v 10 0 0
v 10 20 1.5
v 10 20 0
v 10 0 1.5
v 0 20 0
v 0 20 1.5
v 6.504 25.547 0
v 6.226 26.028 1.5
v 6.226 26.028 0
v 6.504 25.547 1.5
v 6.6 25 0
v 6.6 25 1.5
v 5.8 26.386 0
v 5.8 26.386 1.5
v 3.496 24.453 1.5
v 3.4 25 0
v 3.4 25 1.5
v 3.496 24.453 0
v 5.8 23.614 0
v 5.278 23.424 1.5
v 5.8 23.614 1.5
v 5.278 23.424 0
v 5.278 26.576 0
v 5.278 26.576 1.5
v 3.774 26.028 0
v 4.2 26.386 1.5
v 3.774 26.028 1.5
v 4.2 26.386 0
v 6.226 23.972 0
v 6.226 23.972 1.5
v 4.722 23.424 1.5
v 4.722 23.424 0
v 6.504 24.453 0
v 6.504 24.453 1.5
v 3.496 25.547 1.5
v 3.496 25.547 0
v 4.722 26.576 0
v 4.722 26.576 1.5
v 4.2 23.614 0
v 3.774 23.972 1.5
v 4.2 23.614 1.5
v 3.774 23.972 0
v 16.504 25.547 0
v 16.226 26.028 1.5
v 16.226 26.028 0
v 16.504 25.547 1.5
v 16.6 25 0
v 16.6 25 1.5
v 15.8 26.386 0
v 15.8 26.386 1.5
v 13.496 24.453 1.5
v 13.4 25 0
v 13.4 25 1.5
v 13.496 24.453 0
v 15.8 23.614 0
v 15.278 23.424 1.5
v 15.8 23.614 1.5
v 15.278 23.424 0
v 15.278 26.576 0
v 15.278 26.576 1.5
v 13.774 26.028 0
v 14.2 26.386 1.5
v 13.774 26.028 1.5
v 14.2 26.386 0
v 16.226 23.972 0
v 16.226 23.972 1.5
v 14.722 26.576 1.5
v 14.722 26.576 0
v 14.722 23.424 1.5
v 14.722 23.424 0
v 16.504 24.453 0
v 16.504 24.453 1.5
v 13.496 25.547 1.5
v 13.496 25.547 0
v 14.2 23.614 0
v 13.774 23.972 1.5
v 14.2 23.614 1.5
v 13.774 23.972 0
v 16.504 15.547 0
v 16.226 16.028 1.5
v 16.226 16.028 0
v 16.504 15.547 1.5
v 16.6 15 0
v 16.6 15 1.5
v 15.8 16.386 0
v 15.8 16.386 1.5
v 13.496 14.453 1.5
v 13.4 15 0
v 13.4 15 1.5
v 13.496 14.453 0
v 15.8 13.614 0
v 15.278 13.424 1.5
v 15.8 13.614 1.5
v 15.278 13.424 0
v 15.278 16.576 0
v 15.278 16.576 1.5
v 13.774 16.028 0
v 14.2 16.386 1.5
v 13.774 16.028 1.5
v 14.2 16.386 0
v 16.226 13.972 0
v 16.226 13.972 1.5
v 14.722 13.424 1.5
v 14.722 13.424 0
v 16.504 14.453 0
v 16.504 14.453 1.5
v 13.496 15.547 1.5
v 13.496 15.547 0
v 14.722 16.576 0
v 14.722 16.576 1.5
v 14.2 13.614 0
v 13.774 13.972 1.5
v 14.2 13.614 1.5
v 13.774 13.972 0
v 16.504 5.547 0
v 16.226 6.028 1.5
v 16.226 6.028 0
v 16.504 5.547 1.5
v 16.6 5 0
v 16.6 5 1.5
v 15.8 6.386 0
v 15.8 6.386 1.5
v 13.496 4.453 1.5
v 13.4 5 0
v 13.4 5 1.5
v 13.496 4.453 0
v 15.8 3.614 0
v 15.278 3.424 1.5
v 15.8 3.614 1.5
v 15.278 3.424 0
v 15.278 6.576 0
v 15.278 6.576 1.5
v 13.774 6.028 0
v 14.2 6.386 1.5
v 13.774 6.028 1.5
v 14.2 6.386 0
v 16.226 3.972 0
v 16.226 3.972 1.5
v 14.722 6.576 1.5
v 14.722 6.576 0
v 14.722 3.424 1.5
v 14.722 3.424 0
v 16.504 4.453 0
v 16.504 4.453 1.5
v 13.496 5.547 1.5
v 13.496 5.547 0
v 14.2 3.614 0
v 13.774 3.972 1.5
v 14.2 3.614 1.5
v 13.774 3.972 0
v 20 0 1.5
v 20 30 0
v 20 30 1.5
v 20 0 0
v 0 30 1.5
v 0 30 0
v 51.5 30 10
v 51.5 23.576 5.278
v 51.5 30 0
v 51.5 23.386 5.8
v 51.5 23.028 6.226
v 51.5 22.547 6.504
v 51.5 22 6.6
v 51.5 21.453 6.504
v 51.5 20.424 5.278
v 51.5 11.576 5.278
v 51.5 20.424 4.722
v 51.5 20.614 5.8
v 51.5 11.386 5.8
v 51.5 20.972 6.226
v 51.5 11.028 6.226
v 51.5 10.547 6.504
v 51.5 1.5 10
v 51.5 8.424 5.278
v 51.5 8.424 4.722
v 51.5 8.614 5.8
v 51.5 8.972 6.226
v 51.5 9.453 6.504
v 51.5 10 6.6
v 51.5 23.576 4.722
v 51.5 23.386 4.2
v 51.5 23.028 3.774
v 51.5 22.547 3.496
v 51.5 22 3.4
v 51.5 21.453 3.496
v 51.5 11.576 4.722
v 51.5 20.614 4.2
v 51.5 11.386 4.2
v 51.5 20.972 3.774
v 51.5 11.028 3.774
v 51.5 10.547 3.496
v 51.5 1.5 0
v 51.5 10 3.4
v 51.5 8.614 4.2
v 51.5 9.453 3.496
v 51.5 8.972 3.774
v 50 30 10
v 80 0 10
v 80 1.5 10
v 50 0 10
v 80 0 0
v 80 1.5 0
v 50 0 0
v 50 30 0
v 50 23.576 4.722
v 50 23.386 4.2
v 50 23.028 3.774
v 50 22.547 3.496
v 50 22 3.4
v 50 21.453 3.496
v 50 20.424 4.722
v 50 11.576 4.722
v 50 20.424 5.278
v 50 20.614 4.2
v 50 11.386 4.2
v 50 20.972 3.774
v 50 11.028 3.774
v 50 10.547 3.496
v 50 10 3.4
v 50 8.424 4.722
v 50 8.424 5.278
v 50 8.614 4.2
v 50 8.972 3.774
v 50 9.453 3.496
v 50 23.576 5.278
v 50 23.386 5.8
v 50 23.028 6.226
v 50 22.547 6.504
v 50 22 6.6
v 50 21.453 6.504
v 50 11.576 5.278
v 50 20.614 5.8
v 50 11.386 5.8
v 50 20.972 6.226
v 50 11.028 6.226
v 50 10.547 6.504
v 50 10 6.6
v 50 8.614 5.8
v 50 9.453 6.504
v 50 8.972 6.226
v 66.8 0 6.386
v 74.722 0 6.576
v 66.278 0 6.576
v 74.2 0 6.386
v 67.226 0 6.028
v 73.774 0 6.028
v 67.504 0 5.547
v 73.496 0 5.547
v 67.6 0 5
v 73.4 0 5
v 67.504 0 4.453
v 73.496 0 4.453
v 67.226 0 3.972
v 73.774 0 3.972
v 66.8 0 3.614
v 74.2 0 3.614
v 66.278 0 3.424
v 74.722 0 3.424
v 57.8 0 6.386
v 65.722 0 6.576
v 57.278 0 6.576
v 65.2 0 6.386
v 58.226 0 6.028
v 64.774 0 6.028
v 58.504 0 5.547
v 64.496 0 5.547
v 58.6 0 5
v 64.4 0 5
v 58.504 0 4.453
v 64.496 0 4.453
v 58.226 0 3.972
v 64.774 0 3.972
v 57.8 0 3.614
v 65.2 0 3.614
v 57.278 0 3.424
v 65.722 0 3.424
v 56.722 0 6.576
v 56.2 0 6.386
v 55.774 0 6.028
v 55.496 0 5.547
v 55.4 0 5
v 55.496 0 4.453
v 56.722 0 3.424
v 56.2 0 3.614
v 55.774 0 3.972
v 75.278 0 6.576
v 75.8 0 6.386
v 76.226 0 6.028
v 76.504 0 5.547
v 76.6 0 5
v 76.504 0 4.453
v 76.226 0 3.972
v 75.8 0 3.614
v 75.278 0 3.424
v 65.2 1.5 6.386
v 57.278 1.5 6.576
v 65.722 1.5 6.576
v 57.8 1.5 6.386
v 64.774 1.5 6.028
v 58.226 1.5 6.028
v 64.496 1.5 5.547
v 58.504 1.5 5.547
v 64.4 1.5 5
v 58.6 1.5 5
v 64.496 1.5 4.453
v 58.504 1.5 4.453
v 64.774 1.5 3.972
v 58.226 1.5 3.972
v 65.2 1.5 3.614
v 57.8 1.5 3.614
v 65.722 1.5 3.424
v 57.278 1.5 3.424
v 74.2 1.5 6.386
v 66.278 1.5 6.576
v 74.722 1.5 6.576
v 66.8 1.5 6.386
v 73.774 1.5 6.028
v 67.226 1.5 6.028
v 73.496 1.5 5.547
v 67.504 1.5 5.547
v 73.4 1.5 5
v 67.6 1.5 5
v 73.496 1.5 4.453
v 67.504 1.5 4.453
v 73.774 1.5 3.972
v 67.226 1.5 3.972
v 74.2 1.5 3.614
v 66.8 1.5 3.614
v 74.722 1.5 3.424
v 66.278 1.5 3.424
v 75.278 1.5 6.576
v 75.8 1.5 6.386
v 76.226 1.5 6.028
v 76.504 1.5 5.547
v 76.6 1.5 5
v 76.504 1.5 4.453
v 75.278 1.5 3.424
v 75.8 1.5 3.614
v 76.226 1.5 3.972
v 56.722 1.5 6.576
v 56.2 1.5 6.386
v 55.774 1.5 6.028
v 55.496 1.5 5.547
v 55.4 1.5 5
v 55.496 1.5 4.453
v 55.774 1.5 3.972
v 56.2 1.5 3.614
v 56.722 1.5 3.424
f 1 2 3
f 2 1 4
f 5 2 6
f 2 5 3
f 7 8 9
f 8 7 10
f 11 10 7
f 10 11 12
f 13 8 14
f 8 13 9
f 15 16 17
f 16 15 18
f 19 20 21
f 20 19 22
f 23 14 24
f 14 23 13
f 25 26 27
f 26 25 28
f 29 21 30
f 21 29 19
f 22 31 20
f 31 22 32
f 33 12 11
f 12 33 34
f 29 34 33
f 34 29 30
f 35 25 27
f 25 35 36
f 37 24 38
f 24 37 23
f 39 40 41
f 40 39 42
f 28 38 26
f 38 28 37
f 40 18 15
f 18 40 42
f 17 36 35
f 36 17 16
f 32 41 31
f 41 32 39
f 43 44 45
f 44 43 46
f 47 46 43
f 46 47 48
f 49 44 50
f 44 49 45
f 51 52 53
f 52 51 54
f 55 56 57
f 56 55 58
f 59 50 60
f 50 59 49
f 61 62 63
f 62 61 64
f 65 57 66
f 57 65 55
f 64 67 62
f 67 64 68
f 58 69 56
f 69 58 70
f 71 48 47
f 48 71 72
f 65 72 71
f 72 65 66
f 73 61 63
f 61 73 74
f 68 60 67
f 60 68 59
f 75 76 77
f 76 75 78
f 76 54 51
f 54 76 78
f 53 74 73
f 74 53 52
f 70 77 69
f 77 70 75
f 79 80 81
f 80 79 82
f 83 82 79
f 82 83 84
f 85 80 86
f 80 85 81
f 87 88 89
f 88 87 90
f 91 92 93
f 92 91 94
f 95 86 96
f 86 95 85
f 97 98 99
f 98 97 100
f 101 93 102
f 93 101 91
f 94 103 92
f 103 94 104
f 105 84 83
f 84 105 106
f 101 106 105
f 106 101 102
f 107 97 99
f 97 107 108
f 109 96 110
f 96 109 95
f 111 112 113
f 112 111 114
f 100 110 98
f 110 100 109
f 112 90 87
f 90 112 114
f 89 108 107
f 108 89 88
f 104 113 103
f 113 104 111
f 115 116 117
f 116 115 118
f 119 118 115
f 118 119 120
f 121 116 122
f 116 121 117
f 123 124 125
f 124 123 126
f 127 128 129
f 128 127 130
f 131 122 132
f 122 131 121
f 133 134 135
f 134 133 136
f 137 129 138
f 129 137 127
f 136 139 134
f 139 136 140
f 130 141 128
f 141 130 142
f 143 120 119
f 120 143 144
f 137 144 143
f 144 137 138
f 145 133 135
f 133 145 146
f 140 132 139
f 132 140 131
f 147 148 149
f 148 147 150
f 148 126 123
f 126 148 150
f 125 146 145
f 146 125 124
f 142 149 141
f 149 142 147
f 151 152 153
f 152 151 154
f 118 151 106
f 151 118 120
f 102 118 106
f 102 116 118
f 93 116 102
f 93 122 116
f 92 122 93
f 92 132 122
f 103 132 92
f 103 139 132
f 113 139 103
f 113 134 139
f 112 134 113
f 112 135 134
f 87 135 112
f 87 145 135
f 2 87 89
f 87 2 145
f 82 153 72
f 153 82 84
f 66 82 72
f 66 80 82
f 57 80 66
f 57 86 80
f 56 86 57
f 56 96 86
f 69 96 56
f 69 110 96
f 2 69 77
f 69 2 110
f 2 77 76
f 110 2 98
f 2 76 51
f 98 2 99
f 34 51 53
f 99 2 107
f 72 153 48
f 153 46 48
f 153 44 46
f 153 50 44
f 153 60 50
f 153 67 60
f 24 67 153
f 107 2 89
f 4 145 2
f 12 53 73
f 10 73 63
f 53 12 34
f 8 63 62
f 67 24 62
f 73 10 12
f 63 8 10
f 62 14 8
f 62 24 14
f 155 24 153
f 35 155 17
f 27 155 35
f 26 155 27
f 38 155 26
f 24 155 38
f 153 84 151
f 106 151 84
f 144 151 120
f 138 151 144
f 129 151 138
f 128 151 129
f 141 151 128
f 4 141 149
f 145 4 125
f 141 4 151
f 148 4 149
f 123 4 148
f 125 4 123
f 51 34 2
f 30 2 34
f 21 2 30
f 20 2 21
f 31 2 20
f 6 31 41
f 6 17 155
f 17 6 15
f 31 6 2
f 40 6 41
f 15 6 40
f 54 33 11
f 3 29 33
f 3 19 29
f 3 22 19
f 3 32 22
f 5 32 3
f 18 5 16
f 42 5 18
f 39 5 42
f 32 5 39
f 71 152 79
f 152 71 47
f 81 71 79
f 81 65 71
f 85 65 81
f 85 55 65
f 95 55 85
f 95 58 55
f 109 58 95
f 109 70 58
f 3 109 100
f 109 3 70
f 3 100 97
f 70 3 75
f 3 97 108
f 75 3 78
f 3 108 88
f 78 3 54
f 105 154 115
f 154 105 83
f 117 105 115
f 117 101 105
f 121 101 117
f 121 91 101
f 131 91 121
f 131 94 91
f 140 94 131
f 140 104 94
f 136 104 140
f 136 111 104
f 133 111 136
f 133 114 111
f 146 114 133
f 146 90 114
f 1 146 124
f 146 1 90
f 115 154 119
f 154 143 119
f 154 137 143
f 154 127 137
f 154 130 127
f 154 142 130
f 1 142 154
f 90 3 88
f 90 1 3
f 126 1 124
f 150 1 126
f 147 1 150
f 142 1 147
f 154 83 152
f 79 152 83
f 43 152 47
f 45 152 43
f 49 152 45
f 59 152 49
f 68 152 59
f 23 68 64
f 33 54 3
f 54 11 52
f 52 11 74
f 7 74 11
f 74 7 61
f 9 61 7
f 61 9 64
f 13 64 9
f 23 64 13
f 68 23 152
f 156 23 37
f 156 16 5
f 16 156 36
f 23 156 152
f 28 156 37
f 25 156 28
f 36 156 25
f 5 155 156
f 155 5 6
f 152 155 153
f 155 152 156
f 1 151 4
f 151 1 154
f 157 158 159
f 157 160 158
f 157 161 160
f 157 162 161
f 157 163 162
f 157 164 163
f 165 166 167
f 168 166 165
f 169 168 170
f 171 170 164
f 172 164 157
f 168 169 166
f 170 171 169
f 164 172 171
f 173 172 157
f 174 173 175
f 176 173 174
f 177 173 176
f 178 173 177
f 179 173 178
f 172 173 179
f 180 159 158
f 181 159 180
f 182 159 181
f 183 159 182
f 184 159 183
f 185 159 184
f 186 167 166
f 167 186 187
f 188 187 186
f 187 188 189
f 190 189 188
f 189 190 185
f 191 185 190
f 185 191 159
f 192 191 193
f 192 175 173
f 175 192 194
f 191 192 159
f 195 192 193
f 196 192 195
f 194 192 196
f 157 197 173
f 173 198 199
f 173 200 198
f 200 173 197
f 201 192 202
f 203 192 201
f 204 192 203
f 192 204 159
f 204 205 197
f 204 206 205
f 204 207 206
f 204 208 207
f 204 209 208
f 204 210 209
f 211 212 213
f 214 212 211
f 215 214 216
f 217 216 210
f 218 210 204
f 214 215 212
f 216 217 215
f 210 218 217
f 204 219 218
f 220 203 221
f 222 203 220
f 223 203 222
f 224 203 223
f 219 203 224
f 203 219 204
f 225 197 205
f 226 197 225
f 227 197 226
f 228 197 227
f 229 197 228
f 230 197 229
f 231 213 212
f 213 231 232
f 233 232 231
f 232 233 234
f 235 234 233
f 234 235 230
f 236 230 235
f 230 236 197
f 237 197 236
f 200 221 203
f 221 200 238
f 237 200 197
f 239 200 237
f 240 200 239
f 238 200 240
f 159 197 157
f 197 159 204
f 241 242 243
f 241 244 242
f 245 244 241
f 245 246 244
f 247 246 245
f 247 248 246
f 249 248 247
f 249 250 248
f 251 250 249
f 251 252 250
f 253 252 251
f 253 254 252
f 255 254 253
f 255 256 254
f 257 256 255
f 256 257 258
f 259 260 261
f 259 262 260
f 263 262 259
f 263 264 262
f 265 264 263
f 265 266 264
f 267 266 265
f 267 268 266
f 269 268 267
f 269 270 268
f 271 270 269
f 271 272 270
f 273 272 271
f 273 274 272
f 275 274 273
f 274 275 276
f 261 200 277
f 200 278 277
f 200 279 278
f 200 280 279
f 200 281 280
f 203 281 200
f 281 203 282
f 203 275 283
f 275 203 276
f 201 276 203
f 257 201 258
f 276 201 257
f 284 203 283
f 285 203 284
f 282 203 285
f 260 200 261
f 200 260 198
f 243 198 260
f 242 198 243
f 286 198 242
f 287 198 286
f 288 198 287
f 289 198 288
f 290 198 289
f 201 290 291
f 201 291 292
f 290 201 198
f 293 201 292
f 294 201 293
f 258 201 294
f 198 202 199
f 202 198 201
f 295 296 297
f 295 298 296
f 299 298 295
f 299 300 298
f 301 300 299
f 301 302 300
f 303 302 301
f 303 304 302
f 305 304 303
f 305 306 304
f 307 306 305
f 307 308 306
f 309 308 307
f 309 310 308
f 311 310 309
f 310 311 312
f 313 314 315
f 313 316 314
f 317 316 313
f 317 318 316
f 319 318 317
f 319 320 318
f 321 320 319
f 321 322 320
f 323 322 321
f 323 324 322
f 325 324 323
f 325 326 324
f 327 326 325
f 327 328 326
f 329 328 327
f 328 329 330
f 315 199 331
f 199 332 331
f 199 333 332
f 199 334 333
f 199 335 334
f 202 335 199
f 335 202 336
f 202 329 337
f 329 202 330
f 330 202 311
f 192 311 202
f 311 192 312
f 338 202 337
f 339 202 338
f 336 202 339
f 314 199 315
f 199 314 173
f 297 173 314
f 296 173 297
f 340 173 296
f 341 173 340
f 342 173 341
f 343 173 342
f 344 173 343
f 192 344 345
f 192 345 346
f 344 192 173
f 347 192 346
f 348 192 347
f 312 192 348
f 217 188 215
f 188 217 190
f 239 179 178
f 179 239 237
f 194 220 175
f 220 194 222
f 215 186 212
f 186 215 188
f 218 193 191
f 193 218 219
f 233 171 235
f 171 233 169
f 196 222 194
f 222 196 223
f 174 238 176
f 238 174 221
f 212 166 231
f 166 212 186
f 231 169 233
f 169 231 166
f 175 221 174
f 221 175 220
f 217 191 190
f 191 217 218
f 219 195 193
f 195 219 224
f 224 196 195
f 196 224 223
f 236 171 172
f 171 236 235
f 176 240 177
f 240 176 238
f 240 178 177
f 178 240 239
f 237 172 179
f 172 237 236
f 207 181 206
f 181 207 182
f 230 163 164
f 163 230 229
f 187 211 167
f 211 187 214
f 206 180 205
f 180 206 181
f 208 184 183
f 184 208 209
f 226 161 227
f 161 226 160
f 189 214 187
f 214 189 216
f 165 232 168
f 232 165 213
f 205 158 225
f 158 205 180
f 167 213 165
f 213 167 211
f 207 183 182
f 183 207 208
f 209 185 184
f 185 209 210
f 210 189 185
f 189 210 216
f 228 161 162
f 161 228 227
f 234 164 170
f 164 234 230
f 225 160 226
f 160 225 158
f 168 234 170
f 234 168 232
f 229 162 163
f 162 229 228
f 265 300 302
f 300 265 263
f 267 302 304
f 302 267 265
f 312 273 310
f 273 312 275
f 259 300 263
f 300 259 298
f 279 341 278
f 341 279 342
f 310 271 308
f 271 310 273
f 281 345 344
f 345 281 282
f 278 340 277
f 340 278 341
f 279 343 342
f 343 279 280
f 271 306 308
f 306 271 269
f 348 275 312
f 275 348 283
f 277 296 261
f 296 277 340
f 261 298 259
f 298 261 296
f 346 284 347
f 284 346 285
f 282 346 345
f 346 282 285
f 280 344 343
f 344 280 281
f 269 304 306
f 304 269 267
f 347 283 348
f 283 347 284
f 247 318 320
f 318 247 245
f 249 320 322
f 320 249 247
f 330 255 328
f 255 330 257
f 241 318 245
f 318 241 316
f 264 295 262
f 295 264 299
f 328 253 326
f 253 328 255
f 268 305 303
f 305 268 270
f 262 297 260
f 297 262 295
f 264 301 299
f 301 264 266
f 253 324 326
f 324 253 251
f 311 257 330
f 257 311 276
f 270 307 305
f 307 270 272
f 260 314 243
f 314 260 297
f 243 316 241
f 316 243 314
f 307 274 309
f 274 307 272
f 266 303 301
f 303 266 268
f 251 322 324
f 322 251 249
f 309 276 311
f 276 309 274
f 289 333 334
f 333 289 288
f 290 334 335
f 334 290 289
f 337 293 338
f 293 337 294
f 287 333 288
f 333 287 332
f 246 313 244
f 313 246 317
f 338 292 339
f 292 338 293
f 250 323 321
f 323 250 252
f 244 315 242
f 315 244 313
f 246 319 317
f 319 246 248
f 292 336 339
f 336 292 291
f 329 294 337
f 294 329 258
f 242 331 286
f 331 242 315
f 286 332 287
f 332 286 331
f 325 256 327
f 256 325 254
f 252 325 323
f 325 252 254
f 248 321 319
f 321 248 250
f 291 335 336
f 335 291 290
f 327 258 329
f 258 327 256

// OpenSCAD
// file: Color.scad
module brass() {
    color([181 / 255, 166 / 255, 66 / 255])
        children();
}

module limey() {
    color([77 / 255, 255 / 255, 21 / 255, 1])
        children();
}
// main file
use <Color.scad>;

module bracket_bolt_hole_3m() {
        cylinder(h = 10, d = 3.2, $fn = 18);
    }

module l_bracket() {
    color("silver")
    difference() {
        cube([20, 30, 1.5]);
        
        union() {
            translate([-1, -1, -1]) cube([11, 21, 3.5]);
            translate([5, 25, -5]) bracket_bolt_hole_3m();
            translate([15, 25, -5]) bracket_bolt_hole_3m();
            translate([15, 15, -5]) bracket_bolt_hole_3m();
            translate([15, 5, -5]) bracket_bolt_hole_3m();
        }
    }
}

module l_bracket_inner() {
    limey()
    difference() {
        union() {
            cube([1.5, 30, 10]);
            cube([30, 1.5, 10]);
        }

        union() {
            translate([-5, 10, 5]) rotate([0, 90, 0]) bracket_bolt_hole_3m();
            translate([-5, 22, 5]) rotate([0, 90, 0]) bracket_bolt_hole_3m();

            translate([7, 5, 5]) rotate([90, 0 , 0]) bracket_bolt_hole_3m();
            translate([16, 5, 5]) rotate([90, 0, 0]) bracket_bolt_hole_3m();
            translate([25, 5, 5]) rotate([90, 0, 0]) bracket_bolt_hole_3m();
        }
    }
}

l_bracket();
translate([50, 0, 0]) l_bracket_inner();
